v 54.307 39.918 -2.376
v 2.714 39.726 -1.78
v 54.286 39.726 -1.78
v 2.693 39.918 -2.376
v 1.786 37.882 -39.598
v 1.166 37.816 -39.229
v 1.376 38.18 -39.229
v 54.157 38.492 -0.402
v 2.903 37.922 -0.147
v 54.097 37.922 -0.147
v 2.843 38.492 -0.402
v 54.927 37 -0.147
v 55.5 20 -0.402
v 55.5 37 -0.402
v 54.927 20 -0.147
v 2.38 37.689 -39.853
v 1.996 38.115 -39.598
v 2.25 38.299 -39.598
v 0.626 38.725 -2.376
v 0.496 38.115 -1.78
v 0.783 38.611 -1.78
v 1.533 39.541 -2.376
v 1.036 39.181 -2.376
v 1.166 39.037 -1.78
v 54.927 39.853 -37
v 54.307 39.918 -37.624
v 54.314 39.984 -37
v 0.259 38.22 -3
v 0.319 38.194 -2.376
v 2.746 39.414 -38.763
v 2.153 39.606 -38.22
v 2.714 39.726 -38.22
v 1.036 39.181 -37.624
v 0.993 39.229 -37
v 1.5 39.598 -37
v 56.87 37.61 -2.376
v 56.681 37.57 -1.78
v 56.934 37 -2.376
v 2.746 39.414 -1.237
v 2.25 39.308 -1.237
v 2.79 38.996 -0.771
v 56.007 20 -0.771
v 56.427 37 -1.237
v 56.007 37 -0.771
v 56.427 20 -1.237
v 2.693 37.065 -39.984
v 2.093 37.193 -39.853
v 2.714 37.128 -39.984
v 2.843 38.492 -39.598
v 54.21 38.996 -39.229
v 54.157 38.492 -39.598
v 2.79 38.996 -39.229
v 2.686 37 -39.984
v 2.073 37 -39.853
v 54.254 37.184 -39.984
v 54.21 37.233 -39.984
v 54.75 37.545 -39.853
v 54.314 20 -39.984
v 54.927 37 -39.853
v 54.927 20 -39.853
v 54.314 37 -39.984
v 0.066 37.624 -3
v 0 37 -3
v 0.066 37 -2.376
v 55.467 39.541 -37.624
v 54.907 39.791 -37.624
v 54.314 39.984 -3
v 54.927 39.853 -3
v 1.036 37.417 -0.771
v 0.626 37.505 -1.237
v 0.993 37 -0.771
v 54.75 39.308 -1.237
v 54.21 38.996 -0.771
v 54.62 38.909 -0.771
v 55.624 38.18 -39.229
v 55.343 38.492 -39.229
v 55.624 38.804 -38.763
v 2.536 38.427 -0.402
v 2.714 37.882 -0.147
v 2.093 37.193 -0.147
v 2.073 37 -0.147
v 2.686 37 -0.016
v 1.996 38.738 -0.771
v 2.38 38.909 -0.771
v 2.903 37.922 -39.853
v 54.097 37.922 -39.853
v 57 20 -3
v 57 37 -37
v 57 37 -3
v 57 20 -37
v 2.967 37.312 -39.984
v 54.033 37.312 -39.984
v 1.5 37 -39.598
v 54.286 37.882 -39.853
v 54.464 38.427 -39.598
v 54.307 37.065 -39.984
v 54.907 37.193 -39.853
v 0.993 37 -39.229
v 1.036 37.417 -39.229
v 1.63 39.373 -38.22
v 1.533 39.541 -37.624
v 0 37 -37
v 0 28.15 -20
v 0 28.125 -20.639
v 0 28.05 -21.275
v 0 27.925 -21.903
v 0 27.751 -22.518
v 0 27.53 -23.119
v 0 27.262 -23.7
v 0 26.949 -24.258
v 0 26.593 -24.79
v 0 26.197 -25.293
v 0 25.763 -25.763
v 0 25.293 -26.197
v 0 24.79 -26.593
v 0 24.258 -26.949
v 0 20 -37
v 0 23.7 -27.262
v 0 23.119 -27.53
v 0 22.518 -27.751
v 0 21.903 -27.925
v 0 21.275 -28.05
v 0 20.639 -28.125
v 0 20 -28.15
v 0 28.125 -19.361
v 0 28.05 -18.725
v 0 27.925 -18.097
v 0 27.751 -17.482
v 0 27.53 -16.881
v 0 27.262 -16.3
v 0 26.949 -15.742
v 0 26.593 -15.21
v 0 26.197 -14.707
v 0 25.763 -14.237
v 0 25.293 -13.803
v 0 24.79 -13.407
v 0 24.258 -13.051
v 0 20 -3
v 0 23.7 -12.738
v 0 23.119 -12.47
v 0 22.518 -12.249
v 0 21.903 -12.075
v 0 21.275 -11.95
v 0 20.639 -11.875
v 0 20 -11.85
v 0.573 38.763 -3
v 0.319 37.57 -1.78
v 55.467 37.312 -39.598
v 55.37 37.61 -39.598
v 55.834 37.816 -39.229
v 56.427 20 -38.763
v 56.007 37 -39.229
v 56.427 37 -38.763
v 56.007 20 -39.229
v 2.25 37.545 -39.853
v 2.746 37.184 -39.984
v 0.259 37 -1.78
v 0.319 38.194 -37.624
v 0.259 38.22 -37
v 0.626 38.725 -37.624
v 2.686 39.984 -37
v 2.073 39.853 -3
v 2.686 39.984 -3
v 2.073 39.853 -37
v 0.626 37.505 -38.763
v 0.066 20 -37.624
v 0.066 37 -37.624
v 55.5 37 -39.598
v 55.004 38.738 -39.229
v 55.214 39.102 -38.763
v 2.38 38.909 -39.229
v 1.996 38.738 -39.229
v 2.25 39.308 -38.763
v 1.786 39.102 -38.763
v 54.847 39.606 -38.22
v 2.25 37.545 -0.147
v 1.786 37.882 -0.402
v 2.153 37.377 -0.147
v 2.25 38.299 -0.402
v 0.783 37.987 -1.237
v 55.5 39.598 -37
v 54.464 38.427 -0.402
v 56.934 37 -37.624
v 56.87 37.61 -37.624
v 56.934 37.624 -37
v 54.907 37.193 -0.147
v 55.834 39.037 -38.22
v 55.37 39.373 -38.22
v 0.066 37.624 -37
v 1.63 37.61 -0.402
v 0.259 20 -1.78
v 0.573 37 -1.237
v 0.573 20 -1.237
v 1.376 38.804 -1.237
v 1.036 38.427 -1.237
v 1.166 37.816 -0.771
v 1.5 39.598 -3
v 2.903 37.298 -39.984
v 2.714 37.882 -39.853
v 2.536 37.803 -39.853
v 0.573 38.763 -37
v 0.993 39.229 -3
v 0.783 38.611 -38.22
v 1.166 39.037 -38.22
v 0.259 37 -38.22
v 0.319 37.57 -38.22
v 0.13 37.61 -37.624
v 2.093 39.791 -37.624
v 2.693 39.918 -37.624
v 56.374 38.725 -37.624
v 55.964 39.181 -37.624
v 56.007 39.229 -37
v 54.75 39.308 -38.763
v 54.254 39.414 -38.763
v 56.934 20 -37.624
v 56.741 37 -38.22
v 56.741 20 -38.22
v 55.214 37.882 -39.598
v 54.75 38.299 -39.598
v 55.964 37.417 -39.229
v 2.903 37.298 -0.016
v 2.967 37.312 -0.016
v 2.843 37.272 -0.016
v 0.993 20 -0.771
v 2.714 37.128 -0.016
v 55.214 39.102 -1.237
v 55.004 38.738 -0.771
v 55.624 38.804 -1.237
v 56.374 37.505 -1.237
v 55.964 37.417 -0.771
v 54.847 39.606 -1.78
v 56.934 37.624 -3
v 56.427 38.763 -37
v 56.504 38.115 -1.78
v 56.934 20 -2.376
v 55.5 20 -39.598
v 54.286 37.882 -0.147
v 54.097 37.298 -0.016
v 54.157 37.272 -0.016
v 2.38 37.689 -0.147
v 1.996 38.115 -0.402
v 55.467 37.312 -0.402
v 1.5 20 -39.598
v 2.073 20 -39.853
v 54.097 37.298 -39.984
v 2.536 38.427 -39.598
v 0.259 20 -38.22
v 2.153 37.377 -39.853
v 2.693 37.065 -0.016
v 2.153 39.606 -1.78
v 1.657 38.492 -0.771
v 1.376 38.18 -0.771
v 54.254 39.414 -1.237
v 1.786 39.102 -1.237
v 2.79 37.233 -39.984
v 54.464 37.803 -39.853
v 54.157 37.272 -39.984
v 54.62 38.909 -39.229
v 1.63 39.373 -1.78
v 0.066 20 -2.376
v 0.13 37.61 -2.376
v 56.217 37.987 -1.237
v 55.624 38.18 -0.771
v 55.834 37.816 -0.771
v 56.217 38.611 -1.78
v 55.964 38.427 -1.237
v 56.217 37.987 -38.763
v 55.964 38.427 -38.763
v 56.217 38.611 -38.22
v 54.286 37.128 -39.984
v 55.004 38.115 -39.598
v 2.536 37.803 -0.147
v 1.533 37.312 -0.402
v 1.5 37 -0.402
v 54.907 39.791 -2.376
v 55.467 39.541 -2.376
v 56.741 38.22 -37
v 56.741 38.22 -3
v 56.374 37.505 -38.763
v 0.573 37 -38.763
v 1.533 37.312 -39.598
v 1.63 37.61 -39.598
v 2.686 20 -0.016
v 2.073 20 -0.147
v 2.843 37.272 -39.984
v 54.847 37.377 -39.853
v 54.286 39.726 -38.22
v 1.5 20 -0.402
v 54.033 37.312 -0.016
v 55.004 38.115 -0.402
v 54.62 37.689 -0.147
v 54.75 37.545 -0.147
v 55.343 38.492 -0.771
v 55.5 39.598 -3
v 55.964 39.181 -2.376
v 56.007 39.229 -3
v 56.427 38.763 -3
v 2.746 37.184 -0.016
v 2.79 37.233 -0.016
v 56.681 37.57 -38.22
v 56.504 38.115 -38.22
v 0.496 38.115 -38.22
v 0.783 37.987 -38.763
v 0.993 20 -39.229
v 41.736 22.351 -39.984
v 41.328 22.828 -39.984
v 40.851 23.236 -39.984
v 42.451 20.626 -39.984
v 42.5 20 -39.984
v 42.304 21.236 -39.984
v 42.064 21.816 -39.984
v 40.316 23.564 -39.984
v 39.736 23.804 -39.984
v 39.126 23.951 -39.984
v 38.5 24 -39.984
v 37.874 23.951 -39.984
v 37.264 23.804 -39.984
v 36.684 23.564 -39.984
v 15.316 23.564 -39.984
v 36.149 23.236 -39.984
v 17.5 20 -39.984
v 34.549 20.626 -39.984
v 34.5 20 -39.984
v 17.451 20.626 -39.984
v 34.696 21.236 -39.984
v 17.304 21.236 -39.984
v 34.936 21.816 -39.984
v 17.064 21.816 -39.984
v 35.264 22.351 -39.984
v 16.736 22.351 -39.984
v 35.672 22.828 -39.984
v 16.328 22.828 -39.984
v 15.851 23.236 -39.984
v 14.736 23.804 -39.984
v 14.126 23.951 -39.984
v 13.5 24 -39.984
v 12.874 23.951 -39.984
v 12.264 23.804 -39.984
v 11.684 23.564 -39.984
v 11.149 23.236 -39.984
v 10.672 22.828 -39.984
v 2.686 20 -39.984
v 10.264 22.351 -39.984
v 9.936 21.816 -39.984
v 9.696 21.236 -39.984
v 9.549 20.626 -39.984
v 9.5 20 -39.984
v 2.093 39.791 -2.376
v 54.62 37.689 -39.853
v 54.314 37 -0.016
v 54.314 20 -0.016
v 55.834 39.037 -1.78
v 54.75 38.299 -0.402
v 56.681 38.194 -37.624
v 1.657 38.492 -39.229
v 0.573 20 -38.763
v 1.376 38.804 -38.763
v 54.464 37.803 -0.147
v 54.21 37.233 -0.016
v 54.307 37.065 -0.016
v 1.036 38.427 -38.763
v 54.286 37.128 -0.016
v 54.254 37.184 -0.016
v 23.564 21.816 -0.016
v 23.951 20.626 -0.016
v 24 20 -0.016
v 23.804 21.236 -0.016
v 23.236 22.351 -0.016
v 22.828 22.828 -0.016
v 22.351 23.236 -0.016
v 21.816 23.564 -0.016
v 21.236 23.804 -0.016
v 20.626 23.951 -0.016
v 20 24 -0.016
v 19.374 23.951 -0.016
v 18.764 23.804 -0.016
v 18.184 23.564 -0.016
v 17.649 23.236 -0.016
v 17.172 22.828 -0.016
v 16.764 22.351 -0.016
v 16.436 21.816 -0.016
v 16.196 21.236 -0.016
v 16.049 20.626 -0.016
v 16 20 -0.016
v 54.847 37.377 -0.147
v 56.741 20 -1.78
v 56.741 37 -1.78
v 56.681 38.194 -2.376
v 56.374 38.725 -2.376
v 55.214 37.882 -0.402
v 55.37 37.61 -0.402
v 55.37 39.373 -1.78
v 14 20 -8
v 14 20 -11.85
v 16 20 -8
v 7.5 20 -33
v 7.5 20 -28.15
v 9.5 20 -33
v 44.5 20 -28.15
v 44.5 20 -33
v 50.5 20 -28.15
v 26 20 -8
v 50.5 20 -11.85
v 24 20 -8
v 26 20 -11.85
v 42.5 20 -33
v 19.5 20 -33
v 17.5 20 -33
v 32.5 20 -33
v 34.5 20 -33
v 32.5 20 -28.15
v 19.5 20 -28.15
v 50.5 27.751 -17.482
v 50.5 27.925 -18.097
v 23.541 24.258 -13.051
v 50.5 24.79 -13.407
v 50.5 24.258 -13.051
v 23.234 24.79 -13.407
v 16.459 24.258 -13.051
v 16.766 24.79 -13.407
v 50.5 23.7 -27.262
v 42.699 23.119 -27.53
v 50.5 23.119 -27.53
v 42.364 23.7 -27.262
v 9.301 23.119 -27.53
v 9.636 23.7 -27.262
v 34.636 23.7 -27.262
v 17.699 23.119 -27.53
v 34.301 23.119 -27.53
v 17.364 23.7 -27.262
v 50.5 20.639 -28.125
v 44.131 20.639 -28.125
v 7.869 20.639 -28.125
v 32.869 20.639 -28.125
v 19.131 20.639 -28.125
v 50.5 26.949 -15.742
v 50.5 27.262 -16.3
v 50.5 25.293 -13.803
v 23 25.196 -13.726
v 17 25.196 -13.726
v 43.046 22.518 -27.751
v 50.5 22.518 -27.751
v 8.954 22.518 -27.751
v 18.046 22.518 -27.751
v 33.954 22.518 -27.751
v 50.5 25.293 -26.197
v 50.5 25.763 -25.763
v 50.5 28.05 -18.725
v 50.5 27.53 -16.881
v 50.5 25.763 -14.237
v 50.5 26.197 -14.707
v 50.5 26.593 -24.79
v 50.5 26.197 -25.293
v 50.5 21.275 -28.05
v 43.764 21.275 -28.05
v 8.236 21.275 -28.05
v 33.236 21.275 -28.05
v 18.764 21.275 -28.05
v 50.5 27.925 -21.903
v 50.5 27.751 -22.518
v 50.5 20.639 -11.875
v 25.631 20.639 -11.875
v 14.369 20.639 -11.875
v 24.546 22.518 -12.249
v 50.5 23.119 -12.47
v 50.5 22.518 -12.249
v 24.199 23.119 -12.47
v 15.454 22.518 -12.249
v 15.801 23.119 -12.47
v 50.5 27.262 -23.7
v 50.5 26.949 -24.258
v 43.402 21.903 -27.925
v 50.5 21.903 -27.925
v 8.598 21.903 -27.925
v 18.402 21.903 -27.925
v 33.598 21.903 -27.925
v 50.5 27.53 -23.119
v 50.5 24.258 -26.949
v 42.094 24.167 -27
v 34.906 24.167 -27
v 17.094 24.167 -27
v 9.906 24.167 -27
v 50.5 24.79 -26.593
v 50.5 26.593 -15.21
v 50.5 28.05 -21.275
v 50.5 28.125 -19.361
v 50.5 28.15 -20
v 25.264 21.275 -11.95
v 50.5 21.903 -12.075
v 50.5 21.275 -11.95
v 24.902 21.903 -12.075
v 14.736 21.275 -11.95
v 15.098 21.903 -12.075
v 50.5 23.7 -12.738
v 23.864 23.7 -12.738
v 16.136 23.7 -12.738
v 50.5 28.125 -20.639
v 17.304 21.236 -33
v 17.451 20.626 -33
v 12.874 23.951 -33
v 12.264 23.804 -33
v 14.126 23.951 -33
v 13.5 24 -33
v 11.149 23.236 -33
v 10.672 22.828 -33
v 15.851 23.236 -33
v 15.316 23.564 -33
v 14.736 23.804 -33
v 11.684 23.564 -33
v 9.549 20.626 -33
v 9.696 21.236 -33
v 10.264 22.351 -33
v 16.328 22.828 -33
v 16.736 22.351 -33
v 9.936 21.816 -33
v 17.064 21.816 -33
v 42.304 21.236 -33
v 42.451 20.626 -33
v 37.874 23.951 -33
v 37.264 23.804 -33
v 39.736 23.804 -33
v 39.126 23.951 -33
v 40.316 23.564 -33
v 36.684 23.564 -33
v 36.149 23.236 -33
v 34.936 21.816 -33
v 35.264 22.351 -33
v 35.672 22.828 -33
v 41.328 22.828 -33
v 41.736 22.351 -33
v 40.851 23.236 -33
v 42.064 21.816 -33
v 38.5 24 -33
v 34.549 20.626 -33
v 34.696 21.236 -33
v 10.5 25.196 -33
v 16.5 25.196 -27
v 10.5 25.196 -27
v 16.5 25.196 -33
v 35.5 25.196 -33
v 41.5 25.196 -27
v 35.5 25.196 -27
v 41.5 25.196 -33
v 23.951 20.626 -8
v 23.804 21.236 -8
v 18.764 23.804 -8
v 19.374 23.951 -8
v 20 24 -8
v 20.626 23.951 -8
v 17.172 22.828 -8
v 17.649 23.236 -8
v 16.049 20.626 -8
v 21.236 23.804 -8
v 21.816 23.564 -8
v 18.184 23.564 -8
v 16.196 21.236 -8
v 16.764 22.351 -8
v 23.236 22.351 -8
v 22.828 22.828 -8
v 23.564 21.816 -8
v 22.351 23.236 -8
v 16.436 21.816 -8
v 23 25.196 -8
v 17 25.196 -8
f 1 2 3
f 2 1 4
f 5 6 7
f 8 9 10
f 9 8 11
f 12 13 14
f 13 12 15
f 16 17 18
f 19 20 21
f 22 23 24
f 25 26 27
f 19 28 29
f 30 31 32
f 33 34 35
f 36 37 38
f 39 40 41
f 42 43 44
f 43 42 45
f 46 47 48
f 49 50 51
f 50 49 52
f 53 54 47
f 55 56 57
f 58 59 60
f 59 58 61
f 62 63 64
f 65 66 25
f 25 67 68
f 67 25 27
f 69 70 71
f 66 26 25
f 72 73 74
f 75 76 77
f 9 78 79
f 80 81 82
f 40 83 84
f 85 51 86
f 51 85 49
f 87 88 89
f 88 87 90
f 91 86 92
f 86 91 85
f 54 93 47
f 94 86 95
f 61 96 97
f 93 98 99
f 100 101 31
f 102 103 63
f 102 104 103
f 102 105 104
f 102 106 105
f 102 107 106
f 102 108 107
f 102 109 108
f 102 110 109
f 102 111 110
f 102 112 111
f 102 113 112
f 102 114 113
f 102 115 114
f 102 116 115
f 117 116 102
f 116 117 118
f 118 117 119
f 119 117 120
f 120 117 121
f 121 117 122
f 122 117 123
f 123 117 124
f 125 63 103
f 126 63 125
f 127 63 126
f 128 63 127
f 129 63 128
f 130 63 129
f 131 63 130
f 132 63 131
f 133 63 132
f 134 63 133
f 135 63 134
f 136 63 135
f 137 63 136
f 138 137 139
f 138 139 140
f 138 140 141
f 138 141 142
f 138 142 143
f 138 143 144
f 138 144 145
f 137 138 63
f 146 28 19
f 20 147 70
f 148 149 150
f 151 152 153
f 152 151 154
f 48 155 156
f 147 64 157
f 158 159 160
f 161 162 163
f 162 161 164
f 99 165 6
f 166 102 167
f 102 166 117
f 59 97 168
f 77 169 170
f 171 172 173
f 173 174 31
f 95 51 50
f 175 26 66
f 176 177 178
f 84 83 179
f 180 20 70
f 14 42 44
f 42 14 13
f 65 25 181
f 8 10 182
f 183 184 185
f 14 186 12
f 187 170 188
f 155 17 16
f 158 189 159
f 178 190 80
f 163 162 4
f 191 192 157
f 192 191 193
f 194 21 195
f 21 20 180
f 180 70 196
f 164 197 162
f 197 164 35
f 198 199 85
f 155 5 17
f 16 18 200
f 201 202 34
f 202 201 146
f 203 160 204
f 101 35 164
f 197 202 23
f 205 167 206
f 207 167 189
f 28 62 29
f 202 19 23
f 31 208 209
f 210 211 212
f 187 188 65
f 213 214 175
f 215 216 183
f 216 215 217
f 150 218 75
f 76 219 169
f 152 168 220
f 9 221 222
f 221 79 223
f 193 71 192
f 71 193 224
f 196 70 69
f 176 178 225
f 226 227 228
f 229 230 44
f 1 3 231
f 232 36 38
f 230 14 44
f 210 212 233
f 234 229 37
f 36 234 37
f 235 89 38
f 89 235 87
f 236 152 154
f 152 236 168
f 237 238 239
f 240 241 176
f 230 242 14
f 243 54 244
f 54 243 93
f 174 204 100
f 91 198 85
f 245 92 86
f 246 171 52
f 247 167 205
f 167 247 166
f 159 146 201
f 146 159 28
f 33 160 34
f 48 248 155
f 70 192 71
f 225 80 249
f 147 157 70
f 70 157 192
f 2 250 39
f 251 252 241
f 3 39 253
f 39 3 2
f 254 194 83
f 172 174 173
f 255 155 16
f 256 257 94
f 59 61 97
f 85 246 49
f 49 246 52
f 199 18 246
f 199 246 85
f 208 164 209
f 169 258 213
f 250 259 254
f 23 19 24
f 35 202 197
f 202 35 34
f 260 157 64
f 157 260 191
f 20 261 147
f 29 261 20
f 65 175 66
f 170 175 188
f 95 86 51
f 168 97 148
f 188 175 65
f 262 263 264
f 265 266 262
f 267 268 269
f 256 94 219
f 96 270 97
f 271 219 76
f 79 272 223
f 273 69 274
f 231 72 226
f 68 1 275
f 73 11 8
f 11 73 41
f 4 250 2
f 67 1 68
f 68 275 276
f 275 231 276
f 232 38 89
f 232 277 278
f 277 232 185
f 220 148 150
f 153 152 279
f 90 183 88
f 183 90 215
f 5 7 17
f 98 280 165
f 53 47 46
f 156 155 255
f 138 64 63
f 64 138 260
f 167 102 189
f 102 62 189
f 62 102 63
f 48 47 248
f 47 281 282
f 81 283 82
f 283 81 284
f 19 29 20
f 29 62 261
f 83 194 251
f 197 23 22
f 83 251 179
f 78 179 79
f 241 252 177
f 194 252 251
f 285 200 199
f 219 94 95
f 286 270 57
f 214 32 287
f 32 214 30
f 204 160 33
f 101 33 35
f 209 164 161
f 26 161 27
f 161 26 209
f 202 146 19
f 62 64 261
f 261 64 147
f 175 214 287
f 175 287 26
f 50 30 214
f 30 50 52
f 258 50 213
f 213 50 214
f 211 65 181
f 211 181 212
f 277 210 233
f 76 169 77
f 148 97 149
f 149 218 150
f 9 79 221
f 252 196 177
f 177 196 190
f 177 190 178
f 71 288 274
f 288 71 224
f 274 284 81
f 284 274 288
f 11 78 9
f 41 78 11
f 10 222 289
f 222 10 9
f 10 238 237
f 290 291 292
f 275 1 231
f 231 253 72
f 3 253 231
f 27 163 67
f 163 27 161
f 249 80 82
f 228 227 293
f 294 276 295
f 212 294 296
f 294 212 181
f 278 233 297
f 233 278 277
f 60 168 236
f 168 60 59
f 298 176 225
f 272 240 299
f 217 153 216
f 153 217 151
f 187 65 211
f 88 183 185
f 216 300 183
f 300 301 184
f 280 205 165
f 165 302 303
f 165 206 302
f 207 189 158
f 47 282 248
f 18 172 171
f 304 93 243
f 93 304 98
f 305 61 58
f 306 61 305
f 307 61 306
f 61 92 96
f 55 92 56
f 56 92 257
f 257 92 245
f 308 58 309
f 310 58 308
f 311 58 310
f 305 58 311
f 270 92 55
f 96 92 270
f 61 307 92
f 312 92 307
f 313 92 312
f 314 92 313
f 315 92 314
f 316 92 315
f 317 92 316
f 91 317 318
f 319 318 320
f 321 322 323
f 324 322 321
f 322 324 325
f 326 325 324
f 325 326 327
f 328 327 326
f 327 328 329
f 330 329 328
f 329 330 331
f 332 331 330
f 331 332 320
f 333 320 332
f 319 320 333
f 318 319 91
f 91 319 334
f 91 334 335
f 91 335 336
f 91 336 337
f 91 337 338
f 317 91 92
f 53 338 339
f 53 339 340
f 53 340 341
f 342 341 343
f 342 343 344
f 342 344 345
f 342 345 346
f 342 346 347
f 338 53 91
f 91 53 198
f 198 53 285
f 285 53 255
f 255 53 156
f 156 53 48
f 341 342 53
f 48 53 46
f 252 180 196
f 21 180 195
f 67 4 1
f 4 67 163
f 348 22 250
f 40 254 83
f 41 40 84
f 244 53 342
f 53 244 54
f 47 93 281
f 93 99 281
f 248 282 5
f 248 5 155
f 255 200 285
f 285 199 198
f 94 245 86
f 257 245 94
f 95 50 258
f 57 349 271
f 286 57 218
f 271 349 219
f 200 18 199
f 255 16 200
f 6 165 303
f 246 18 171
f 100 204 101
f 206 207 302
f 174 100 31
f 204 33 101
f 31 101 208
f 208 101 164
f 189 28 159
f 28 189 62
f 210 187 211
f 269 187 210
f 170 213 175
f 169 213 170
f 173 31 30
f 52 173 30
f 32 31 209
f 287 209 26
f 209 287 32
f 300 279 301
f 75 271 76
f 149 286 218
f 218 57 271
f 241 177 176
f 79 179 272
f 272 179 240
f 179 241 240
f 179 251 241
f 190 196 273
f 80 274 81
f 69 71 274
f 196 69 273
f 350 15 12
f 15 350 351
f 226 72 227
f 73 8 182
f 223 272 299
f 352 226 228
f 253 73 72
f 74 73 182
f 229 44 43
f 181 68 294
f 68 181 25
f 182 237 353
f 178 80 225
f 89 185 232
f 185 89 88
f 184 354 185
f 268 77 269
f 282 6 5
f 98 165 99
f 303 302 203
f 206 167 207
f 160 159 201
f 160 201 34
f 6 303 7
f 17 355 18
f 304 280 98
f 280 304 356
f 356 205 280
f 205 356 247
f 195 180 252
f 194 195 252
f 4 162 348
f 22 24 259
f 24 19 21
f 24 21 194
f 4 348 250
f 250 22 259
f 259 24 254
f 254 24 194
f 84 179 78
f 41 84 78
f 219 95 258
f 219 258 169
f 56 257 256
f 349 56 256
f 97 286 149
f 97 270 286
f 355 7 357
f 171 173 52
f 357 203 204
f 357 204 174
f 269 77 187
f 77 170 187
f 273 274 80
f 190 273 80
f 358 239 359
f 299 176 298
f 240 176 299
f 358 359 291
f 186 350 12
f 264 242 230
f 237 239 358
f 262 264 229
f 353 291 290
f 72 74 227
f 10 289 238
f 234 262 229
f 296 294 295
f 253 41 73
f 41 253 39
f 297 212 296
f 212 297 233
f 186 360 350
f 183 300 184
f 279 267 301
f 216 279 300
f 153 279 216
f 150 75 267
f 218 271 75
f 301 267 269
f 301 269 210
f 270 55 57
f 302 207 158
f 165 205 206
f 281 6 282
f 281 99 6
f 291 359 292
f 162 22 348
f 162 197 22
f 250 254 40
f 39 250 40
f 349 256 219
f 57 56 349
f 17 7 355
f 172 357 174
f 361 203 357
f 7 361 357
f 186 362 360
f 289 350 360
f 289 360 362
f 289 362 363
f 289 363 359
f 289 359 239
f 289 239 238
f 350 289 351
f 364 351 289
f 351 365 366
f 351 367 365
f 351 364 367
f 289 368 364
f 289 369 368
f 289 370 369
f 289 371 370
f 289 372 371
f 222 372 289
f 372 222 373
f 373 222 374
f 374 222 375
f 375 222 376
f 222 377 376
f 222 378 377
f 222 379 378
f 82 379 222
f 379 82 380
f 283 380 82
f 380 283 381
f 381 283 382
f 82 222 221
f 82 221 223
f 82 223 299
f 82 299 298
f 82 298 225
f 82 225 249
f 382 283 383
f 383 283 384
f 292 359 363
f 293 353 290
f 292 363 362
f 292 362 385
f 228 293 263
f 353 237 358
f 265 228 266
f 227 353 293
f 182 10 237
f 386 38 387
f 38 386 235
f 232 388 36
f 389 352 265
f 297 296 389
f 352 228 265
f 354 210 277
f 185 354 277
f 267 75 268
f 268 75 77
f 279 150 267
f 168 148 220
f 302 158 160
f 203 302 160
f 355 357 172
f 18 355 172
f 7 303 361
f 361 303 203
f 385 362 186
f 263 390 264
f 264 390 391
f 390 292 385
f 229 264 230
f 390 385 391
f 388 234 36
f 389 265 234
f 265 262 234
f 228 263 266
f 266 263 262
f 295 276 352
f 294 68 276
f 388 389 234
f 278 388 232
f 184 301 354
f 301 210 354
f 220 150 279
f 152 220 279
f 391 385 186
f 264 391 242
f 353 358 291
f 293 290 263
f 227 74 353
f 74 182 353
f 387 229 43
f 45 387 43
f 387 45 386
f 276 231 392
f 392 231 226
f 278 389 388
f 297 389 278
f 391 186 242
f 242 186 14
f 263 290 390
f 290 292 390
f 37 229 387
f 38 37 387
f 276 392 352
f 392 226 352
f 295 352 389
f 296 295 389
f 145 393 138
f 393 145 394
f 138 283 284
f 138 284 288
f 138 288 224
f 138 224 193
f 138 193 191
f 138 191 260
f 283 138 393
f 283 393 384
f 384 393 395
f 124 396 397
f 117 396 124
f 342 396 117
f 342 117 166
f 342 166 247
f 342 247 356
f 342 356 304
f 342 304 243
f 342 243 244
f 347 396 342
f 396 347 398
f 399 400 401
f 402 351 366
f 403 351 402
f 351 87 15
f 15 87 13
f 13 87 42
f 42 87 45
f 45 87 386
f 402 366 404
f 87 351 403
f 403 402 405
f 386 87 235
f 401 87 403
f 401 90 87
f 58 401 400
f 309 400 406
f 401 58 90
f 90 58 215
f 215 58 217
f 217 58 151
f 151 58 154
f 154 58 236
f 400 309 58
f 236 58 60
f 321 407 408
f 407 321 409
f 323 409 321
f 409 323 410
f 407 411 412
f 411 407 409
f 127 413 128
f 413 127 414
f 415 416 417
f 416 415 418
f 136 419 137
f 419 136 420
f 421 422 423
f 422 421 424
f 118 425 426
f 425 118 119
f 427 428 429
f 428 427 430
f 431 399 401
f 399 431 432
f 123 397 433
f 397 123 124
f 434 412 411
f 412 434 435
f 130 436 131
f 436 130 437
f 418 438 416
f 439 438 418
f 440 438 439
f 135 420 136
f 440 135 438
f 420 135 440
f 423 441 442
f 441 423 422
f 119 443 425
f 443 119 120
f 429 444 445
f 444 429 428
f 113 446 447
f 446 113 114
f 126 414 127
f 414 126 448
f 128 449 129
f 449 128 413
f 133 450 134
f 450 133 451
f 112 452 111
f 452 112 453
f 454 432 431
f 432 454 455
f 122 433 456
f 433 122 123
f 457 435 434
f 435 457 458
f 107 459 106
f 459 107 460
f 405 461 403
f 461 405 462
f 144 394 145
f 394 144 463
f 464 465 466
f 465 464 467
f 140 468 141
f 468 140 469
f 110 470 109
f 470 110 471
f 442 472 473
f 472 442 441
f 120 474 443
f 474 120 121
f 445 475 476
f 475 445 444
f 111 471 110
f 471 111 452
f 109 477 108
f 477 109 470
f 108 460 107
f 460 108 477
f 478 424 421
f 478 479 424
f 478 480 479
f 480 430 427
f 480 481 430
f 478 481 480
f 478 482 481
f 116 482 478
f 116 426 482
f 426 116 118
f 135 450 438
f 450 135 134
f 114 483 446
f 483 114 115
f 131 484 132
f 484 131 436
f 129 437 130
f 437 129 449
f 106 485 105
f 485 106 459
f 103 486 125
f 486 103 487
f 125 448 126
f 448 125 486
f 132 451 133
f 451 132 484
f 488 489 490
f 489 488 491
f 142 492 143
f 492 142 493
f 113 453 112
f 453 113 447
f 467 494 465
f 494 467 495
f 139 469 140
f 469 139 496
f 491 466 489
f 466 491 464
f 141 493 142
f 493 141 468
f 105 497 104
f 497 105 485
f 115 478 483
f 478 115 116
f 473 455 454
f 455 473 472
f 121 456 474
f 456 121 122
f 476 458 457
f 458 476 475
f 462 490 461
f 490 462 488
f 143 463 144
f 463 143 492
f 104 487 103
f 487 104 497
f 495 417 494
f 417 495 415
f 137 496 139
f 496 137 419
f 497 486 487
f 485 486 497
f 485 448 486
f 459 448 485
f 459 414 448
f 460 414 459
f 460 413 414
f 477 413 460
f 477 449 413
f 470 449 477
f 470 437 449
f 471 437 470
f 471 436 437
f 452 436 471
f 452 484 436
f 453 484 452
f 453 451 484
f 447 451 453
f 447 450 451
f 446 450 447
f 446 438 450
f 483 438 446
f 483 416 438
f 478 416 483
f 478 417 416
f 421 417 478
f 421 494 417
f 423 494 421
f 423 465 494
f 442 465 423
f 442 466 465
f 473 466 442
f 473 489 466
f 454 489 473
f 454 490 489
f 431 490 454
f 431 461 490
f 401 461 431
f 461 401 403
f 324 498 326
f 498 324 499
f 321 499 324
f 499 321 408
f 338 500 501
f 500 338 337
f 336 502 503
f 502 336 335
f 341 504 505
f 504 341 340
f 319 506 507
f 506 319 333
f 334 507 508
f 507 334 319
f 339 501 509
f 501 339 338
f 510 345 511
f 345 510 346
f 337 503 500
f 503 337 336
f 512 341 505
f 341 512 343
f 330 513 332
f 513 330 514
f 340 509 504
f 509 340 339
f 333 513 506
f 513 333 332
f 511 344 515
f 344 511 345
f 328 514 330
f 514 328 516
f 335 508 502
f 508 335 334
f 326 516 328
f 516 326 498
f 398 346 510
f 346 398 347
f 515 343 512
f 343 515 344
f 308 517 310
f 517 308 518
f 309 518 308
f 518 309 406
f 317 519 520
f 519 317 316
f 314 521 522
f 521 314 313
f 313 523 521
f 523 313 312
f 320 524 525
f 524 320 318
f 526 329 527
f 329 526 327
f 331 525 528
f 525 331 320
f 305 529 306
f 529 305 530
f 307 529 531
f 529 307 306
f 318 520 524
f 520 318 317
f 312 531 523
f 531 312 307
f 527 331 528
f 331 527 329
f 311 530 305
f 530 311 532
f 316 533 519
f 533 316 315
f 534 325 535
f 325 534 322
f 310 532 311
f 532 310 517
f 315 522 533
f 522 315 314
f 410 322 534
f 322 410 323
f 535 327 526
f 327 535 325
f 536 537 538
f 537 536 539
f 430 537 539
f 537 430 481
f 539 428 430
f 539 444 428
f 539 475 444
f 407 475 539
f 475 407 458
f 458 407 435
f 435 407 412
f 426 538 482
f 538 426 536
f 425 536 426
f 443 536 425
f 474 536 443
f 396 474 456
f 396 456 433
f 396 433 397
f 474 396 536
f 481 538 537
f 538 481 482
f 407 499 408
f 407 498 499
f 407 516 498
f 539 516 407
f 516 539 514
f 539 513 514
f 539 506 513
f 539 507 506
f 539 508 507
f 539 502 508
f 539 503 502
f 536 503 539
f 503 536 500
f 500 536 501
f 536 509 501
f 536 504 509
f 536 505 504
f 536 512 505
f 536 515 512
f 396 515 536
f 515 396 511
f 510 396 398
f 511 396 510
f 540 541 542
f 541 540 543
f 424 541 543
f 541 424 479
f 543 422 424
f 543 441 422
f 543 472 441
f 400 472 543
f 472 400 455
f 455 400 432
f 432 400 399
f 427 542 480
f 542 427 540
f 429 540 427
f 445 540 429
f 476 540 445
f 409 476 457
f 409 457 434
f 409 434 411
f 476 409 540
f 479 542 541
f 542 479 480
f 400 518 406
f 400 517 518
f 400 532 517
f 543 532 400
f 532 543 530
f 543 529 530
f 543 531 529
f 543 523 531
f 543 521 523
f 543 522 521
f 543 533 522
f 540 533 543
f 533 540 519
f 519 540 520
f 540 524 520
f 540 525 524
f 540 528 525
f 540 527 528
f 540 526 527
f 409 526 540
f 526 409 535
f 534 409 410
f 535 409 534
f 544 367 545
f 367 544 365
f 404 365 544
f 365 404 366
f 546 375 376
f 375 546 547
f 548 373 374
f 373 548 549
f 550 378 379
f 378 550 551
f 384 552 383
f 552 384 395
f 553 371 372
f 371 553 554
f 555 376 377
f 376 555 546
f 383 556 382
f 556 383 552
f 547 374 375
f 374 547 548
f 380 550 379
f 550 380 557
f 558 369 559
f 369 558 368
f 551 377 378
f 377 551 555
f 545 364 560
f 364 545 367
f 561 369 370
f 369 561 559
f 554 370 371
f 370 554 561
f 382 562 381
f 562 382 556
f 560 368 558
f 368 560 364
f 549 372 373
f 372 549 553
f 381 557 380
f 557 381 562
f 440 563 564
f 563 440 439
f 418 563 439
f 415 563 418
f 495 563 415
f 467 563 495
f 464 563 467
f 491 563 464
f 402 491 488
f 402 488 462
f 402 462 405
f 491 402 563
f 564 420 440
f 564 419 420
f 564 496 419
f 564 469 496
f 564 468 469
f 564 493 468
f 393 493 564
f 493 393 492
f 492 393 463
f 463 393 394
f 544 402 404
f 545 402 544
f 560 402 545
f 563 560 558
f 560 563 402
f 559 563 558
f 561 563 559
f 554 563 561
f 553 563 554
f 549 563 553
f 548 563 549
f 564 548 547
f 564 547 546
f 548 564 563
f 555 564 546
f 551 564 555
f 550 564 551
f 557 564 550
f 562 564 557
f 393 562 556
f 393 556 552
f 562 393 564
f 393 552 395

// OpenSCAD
// file: Open_RALF_wheel.scad
// Aifred - FabLab Open Source Autonomous Troley
q      =  5;

use <Open_RALF_utils.scad>

play    =  0.3;

axis_di = 16.0;
axis_le = 52.0;
axis_lc = 45.0;
axis_hc =  3.0;
axis_ga =  3.0;


wheel();


module axis() color([0.6,0.6,0.65,1]) {
    translate([0,0,-axis_le]) difference() {
        cylinder(d=axis_di, h=axis_le+10, $fn=axis_di*q);
        translate([-10-axis_di/2+axis_hc,-10,2.9]) cube([10, 20, axis_lc]);
    }
}


module wheel() rotate([0,-90,0]){
    h1= 4.3;
    h2=46.0;
    h3=12.0;
    wt=44.5;
    axis();
    color([0.8,0.8,0.8,1]) {
    difference() {
        cylinder(d1=35,d2=46,h=h1,$fn=46*q);
        cylinder(d=25,h=100,center=true,$fn=25*q);
    }
    translate([0,0,h1   ]) cylinder(d=135,h=h2,$fn=135*q);
    translate([0,0,h1+h2]) cylinder(d1=128,d2=110,h=h3,$fn=135*q);
    }
    //translate([0, 0,h1+1+wt/2]) cylinder(d=175,h=1,$fn=135*q);
    //translate([0, 0,h1+1     ]) cylinder(d=152,h=1,$fn=135*q);
    color([0.2,0.2,0.2,1]) 
    difference()  {
        translate([0, 0,h1+1+wt/2]) rotate_extrude(convexity = 10, $fn = 100)
        translate([60.5, 0, 0]) circle(r = 27, $fn = 55*q);
        translate([-200,-200,h1+1+wt]) cube([400,400,100]);
        translate([-200,-200,h1+1-100]) cube([400,400,100]);
    }
    
}
// file: Open_RALF_utils.scad
q      =  5;


module rcube(siz, rad) {            // rounded cube 
    xi = max(0.0001,siz[0]-2*rad);  // need to always ahve a value > 0
    yi = max(0.0001,siz[1]-2*rad);
    hi = max(0.0001,siz[2]-2*rad);
    minkowski() {
        cube([xi, yi, hi], center=true);
        sphere(r=rad, $fn=2*rad*q);
    }  
}


module srcube(siz, rad) {           // semi rounded cube
    xi = max(0.0001,siz[0]-2*rad);
    yi = max(0.0001,siz[1]-2*rad);
    hi =            siz[2]/2;
    minkowski() {
        cube([xi, yi, hi], center=true);
        cylinder(r=rad, h=hi, center=true, $fn=2*rad*q);
    }  
}
// main file
// Aifred - FabLab Open Source Autonomous Troley
q      =  5;



use <Open_RALF_utils.scad>
use <Open_RALF_wheel.scad>

play    =  0.3;

fix_ra  =  3.0;

axis_di = 16.0;
axis_le = 52.0;
feet_le = 40.0;
feet_wi = 40.0;

ax_fix();



module ax_fix() color([0.99,0.7,0.1,1]){
    translate([ (axis_le+5)/2, feet_wi/2,-axis_di*1.25]) difference() {
        rcube([axis_le+5, axis_di*2.5, axis_di*2.5], fix_ra);
        translate([-50,-50,-50]) cube([100,50,100]);
        translate([-(axis_le+5)/2-1.5, 0,0   ]) rotate([0,90,0]) cylinder(d=axis_di+play,h=axis_le,$fn=axis_di*q);
        translate([-15, 0,-axis_di*1.25]) cylinder(d= 8, h=16,$fn=8*q);
        translate([ 10, 0,-axis_di*1.25]) cylinder(d= 8, h=16,$fn=8*q);
        translate([-15, 0,-axis_di*1.25+7]) cylinder(d=12, h= 6,$fn=6  );
        translate([ 10, 0,-axis_di*1.25+7]) cylinder(d=12, h= 6,$fn=6  );
        translate([-(axis_le+5)/2+feet_le/2,0,0]) cylinder(d= 8, h=30,$fn=8*q);
        translate([-(axis_le+5)/2+feet_le/2,0,6]) cylinder(d=12, h=6,$fn=6);
    }
}
